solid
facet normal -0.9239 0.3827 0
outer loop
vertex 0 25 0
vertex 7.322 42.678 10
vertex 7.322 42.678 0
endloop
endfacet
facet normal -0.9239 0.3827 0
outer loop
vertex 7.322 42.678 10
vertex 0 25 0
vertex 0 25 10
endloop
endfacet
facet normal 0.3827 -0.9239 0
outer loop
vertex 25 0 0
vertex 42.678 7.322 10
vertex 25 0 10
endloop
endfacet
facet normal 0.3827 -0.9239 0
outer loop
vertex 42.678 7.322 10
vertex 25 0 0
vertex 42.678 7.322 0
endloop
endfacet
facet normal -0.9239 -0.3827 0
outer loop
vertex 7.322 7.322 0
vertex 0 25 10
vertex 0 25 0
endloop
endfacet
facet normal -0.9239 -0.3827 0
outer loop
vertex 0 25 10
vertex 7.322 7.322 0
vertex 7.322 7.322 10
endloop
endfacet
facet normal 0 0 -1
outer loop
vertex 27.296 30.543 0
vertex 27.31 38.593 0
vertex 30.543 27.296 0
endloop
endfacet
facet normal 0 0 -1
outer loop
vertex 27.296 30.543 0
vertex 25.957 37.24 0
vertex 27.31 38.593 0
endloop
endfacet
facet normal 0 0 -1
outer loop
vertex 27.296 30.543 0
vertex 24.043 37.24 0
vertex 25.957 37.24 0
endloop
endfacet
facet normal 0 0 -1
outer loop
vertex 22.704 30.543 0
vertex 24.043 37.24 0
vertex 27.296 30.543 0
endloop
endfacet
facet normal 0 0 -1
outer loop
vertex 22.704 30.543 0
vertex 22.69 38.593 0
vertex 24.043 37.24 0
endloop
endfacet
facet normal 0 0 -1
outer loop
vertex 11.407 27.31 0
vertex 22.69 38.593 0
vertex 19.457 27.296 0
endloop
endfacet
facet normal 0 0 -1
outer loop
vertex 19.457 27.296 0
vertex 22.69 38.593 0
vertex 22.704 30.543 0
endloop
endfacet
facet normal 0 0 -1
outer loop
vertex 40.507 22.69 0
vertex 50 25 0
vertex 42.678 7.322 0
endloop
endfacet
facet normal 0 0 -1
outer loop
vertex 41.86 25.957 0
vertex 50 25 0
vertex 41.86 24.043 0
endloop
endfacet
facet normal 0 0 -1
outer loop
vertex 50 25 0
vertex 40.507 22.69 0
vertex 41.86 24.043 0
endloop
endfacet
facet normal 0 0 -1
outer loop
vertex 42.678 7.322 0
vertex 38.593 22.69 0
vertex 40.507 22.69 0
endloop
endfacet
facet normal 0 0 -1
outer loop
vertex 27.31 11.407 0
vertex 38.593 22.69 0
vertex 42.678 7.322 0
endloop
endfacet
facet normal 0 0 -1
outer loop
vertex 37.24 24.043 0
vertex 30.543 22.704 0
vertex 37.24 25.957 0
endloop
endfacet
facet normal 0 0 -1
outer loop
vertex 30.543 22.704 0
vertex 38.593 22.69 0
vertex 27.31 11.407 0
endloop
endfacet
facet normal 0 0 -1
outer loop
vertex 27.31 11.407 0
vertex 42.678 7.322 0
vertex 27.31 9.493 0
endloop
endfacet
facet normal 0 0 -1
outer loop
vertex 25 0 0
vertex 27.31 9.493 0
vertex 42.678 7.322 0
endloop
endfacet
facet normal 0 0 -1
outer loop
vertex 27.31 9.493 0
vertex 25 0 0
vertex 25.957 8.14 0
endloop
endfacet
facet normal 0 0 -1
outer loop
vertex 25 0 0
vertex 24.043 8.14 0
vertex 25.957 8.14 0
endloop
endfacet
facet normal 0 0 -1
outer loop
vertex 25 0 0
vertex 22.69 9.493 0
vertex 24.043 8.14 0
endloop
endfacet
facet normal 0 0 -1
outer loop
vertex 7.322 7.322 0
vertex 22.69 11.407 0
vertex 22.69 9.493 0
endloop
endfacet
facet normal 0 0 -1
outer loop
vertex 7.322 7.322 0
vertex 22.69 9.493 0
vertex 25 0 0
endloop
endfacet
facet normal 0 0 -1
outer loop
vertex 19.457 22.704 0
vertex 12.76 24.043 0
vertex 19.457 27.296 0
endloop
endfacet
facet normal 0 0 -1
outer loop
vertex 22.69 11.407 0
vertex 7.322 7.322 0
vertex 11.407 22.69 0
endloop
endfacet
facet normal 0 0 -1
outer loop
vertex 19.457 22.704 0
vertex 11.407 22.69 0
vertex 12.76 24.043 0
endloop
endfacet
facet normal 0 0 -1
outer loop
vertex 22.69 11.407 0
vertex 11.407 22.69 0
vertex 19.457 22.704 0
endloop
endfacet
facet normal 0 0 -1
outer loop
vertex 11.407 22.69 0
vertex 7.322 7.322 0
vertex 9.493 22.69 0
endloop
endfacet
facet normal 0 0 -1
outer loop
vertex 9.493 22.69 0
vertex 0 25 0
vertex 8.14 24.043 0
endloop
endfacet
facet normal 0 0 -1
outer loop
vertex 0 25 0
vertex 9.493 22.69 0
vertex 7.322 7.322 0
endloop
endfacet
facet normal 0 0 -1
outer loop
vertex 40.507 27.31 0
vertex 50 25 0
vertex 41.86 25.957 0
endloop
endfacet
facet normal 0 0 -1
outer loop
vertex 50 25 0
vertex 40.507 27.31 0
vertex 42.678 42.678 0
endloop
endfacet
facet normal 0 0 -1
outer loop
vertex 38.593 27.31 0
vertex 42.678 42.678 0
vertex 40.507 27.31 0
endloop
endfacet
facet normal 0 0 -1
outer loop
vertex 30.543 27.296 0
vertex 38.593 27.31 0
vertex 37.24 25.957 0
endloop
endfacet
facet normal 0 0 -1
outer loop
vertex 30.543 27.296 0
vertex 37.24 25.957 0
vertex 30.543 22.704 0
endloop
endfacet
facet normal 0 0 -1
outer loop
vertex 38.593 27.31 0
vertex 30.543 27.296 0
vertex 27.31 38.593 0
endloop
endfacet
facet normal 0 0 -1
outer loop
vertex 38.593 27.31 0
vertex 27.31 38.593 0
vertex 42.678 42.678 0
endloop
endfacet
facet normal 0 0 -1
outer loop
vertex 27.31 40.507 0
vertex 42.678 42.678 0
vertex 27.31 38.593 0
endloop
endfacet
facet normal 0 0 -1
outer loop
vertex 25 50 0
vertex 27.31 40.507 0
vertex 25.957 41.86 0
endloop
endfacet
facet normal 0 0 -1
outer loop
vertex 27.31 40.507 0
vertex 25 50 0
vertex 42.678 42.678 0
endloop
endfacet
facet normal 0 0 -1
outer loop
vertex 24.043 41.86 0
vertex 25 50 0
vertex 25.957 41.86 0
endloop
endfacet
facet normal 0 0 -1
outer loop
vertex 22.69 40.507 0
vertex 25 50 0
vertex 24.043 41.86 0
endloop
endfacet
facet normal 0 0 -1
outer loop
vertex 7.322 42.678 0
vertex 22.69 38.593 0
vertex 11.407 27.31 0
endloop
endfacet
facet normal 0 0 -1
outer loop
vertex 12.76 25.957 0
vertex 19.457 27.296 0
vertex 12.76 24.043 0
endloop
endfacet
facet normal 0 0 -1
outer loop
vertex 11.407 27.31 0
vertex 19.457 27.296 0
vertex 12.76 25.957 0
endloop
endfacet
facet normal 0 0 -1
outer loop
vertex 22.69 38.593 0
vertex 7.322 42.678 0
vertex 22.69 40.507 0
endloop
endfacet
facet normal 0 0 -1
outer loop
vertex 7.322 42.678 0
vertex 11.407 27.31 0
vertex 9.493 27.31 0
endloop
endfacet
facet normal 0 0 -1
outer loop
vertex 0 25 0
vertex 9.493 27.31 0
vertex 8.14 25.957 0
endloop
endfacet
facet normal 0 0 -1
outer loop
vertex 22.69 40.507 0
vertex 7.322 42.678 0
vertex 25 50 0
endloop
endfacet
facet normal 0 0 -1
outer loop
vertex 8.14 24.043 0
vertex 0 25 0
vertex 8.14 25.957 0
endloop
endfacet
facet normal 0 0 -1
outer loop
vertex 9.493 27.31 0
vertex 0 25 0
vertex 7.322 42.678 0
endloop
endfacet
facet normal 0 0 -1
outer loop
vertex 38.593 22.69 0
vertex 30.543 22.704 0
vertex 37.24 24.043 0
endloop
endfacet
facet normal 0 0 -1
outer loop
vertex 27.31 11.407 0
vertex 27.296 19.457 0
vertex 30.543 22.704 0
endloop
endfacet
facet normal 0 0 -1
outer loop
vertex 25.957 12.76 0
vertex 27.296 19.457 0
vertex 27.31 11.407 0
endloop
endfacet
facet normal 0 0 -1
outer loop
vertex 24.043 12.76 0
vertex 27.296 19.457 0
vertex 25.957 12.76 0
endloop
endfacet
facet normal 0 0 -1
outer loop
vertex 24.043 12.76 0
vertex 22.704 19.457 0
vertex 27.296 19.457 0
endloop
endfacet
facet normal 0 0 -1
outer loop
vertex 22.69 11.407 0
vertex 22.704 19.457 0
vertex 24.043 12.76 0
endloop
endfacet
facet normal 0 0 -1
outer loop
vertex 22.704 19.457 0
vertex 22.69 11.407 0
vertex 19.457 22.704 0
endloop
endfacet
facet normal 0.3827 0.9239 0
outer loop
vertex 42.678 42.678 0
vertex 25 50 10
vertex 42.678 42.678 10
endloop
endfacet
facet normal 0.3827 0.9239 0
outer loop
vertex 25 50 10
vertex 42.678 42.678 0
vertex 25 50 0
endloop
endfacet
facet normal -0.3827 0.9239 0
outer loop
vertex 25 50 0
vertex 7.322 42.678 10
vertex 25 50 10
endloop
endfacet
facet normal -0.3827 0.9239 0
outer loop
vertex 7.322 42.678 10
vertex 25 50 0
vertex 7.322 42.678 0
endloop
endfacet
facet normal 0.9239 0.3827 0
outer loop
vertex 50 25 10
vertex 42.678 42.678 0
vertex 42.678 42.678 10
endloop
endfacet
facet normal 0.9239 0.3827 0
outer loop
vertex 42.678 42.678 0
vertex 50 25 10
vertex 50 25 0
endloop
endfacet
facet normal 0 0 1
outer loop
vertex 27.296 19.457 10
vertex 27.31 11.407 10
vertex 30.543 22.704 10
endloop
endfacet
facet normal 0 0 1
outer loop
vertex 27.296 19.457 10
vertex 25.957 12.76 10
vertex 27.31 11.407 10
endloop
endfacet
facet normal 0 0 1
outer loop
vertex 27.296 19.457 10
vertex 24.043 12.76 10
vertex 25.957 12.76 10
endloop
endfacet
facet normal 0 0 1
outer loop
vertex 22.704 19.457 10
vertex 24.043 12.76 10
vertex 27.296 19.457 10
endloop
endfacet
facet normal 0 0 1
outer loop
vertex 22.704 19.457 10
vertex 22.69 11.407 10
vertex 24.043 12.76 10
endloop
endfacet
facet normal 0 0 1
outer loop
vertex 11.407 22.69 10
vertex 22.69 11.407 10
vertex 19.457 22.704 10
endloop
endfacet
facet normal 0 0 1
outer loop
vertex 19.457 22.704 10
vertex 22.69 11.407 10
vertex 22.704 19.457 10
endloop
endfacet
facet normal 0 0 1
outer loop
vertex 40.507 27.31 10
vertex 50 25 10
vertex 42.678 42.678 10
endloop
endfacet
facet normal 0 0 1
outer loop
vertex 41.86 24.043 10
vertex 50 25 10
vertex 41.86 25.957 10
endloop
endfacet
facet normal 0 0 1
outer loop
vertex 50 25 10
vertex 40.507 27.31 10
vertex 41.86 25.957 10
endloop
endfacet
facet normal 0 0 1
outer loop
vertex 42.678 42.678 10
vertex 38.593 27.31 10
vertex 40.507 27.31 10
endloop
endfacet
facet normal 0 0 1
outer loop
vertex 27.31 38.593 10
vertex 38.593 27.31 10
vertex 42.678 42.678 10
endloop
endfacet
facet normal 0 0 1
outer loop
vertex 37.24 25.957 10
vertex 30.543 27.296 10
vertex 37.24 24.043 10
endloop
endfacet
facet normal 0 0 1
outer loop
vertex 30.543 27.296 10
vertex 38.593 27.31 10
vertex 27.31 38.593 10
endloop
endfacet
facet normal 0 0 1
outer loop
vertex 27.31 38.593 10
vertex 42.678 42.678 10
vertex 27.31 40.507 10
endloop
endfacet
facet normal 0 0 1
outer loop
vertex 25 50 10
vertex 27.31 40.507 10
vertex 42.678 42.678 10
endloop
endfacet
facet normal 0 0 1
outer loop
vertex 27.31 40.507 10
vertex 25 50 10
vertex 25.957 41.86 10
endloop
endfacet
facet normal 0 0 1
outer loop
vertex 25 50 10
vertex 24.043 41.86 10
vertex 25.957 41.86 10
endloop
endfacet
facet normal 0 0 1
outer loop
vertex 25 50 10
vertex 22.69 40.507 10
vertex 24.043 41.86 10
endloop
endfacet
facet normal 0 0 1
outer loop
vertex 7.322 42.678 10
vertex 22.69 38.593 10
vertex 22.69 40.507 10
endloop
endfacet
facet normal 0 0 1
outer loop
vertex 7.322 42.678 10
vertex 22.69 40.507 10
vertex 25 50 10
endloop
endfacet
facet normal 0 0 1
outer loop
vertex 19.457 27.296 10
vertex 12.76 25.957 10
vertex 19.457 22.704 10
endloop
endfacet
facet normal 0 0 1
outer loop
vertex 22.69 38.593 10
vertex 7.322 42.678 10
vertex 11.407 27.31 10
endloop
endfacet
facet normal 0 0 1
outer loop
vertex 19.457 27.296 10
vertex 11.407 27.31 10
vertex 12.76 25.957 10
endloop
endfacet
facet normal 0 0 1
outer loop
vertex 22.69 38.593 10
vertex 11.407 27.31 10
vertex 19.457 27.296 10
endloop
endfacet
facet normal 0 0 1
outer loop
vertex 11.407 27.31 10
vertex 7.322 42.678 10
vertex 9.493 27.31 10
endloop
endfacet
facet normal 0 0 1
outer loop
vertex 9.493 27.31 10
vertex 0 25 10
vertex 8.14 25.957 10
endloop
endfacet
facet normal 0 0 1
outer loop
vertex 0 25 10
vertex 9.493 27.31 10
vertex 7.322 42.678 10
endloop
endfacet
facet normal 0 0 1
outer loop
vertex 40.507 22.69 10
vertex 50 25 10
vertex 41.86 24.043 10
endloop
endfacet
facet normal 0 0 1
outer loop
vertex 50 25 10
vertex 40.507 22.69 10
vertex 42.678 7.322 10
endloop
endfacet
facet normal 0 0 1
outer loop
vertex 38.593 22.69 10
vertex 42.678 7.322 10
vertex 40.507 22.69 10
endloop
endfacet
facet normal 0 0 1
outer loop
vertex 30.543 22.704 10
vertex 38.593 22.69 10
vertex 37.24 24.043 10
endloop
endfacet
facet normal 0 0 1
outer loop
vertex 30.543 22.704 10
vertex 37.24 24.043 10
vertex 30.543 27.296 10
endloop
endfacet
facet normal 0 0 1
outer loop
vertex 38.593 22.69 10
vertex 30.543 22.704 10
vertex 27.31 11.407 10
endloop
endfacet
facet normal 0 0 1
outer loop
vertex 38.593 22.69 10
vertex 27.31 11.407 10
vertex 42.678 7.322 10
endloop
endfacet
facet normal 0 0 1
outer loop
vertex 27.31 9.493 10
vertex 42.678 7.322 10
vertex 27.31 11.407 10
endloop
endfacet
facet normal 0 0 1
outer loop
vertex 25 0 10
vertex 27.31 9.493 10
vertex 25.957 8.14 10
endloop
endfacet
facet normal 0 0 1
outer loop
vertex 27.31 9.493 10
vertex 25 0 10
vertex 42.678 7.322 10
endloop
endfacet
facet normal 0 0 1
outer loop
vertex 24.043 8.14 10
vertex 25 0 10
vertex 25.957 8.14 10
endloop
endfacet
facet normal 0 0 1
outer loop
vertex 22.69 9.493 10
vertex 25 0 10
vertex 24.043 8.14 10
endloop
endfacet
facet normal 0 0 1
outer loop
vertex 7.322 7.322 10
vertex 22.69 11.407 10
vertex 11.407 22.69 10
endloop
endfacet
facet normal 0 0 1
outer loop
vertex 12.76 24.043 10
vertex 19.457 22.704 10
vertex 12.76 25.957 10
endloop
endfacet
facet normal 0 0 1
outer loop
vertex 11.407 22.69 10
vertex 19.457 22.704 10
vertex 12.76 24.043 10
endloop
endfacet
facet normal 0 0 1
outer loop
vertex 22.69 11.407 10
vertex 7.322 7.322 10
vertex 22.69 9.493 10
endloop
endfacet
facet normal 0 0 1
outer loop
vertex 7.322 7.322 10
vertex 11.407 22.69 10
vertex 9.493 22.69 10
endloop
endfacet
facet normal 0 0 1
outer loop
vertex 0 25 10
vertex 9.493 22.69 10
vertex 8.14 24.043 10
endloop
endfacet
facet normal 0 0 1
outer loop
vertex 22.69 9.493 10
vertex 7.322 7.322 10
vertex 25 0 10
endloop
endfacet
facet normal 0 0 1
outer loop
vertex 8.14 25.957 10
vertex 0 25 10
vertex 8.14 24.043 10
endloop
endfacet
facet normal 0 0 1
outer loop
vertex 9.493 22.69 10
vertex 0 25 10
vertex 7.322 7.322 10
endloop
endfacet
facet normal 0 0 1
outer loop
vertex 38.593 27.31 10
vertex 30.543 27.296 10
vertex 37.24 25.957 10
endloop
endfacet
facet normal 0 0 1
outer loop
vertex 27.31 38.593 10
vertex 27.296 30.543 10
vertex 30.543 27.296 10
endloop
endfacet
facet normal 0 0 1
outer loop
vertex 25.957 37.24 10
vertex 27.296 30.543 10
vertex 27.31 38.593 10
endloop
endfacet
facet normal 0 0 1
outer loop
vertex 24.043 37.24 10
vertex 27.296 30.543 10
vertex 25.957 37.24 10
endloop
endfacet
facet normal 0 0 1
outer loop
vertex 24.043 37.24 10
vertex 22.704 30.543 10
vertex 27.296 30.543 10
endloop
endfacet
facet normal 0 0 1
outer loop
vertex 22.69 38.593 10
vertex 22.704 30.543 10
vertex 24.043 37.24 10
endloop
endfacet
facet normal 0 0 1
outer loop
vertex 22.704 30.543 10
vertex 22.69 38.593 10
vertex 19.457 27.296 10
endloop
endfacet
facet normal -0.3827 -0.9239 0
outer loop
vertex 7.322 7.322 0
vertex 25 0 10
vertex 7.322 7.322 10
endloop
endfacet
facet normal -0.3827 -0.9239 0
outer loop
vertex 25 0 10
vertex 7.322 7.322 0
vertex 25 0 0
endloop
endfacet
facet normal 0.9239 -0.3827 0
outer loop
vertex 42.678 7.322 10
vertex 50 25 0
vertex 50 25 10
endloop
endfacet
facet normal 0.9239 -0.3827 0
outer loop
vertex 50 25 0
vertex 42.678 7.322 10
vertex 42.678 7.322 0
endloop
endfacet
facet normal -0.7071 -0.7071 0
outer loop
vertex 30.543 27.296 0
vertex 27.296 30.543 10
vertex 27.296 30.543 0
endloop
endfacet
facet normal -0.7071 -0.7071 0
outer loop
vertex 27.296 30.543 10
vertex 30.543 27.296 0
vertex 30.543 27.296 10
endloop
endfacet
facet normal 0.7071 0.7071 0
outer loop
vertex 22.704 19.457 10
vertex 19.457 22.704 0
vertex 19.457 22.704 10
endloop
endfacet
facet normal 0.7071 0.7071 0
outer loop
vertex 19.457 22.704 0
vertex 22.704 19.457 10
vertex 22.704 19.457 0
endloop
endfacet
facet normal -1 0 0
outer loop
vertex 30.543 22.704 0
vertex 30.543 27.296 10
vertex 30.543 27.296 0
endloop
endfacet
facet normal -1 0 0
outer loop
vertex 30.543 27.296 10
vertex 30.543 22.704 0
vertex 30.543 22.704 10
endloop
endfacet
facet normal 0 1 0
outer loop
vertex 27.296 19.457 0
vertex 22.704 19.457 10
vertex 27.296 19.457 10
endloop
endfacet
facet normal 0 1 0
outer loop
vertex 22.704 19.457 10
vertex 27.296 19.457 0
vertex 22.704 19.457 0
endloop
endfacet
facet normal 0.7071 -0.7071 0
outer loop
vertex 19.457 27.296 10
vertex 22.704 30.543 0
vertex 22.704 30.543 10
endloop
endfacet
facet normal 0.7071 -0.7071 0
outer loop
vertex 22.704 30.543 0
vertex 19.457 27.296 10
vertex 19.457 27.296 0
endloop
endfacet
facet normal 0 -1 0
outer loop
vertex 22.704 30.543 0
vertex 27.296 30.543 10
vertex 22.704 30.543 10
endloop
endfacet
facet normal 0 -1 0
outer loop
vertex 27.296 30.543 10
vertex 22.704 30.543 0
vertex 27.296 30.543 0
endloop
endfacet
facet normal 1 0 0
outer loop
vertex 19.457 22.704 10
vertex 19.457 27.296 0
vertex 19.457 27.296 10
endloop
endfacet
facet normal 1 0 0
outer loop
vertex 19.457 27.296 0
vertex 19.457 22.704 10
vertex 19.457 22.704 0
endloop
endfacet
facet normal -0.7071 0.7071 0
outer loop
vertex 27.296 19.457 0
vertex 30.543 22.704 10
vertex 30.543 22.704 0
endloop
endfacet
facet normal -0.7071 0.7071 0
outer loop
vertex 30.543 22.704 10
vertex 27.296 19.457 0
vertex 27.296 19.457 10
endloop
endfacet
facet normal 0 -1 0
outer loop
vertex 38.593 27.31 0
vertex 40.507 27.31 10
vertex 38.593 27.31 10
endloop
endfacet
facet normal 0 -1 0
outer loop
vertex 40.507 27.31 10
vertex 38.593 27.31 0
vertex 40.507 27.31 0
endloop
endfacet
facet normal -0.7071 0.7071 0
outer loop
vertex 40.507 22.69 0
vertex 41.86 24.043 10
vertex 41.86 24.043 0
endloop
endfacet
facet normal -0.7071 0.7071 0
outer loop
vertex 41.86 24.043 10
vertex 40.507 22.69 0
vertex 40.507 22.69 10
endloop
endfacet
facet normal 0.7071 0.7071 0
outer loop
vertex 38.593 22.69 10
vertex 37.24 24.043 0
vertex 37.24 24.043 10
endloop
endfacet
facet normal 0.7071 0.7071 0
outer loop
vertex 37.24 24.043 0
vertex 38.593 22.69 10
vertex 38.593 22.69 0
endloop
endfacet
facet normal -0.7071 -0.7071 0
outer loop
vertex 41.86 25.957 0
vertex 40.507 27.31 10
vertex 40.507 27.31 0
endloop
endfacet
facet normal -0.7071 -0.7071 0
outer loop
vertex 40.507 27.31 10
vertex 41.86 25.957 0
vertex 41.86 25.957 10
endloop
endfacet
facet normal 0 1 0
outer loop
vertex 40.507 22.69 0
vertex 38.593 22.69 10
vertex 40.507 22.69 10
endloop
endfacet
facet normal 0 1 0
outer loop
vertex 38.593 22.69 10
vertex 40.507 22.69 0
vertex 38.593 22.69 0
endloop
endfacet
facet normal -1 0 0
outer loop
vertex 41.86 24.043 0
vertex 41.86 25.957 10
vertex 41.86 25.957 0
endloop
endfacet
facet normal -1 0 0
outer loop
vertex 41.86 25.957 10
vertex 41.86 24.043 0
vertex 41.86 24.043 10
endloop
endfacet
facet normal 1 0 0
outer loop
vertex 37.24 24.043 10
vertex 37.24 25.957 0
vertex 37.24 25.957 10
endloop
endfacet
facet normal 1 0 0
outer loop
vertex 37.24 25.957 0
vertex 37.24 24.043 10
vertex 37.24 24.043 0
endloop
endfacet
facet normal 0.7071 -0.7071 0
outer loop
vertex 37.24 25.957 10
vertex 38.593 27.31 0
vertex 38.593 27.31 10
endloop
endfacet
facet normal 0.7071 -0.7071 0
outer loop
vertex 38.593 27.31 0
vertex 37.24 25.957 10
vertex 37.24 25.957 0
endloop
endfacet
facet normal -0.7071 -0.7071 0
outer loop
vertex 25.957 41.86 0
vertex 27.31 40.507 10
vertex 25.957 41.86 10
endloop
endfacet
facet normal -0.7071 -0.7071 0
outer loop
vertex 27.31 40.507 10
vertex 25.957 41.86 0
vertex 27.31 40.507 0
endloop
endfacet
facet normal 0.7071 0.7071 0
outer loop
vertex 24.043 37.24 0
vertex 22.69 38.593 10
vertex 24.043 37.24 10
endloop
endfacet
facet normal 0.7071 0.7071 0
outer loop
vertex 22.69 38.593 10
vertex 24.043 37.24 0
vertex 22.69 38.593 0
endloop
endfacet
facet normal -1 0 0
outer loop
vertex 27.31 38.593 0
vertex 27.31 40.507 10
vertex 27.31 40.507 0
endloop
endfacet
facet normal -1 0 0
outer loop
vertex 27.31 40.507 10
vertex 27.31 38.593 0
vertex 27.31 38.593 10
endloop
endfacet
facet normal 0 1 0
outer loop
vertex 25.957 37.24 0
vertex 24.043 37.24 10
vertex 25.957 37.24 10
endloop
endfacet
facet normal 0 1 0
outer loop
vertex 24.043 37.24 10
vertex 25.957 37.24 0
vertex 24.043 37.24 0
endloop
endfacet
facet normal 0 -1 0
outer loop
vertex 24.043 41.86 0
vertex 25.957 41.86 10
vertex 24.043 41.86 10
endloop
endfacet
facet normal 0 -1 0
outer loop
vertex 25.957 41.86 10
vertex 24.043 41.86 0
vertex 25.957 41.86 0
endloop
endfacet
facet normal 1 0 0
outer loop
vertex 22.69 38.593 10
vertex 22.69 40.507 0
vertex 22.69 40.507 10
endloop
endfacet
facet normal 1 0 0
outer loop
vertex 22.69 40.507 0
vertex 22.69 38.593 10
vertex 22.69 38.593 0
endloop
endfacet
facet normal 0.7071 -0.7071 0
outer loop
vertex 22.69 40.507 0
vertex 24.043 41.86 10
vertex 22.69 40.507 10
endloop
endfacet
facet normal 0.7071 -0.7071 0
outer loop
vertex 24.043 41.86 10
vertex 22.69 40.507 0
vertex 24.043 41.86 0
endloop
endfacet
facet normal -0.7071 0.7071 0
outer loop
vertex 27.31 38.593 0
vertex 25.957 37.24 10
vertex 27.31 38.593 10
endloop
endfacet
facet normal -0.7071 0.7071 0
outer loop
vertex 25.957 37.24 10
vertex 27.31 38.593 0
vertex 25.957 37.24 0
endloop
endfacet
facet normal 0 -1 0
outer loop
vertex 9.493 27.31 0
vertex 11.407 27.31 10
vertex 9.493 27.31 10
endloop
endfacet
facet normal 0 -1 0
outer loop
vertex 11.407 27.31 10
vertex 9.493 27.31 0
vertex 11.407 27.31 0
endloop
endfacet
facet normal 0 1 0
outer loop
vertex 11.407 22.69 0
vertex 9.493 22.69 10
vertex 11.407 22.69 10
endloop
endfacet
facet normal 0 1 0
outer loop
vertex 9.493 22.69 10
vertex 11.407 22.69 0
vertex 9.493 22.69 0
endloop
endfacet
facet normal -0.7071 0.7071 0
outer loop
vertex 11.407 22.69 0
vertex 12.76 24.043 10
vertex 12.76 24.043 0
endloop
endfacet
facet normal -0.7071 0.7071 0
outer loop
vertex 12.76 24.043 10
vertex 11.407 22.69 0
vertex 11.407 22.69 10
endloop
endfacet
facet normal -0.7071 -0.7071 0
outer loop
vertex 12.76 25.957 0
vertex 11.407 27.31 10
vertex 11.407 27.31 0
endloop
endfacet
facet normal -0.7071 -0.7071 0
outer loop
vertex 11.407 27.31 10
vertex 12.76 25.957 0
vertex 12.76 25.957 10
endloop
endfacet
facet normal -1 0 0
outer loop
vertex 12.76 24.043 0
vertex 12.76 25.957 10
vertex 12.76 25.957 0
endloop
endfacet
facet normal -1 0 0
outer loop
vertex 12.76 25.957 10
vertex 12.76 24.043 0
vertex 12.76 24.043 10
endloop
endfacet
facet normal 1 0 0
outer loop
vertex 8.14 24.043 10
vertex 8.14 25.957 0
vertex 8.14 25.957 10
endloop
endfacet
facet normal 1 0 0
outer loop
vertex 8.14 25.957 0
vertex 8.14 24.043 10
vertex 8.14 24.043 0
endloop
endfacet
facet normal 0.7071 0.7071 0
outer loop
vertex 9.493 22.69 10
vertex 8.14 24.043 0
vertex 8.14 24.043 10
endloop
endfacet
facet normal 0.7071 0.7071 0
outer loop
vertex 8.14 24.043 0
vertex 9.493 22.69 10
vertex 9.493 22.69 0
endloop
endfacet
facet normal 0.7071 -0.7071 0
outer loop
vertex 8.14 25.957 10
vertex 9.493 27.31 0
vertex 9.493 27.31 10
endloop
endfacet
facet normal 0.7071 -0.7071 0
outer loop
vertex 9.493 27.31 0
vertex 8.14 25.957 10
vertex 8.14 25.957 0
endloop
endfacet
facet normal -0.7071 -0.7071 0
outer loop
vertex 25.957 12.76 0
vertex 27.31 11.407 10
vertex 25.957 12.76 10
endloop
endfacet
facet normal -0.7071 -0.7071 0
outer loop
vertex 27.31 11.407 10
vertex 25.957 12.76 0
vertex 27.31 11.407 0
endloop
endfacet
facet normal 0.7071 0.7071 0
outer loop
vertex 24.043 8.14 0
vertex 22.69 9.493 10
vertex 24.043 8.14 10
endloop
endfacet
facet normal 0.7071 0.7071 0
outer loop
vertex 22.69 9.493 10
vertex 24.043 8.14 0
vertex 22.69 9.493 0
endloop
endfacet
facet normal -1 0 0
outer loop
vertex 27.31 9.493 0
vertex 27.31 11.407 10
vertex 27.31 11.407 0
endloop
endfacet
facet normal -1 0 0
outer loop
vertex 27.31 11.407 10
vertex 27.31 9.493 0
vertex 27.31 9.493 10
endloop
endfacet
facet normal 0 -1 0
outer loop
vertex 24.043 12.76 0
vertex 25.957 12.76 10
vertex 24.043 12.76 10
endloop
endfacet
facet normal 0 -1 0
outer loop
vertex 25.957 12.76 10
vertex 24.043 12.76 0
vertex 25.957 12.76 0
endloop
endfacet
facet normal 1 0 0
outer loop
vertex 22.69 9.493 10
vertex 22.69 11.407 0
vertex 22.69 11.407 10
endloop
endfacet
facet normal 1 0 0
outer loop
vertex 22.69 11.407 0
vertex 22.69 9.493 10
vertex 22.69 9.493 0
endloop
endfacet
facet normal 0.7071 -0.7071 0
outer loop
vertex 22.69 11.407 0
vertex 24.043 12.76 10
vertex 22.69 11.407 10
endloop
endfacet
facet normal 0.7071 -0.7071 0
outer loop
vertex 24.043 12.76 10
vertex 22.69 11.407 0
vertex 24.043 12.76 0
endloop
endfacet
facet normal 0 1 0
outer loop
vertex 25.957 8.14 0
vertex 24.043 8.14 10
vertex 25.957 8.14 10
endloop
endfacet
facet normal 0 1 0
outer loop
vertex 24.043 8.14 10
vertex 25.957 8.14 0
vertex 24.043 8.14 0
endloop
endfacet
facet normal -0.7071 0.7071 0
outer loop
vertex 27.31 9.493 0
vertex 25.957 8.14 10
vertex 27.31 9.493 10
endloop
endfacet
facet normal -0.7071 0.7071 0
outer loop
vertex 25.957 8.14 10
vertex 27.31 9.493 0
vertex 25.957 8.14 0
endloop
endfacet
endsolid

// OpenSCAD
$fn = 32;

// ----------------------------------------------------------------------
// Polygon plate: 8-gon R25, 4 bolt windows
// ----------------------------------------------------------------------

// --- parameters (mm) ---
sides = 8;                // number of polygon sides
plate_r = 25;             // circumscribed radius of the polygon
bore_r = 6;               // centre bore radius
bolts = 4;                // number of bolt windows
ring_r = 14.55;           // bolt-circle radius
bolt_r = 2.5;             // bolt window radius
plate_t = 10;             // plate thickness, Z (extrusion height)

plate_d = 2 * plate_r;  // circumscribed diameter
bore_d = 2 * bore_r;  // centre bore diameter
bolt_d = 2 * bolt_r;  // bolt window diameter
ring_d = 2 * ring_r;  // bolt-circle diameter

profile = [[50, 25], [42.678, 42.678], [25, 50], [7.322, 42.678], [0, 25], [7.322, 7.322], [25, 0], [42.678, 7.322]];  // primary outline, 8 points, counter clockwise
void_1 = [[30.543, 27.296], [27.296, 30.543], [22.704, 30.543], [19.457, 27.296], [19.457, 22.704], [22.704, 19.457], [27.296, 19.457], [30.543, 22.704]];  // centre bore, 8 points
void_2 = [[41.86, 25.957], [40.507, 27.31], [38.593, 27.31], [37.24, 25.957], [37.24, 24.043], [38.593, 22.69], [40.507, 22.69], [41.86, 24.043]];  // bolt window 1, 8 points
void_3 = [[27.31, 40.507], [25.957, 41.86], [24.043, 41.86], [22.69, 40.507], [22.69, 38.593], [24.043, 37.24], [25.957, 37.24], [27.31, 38.593]];  // bolt window 2, 8 points
void_4 = [[12.76, 25.957], [11.407, 27.31], [9.493, 27.31], [8.14, 25.957], [8.14, 24.043], [9.493, 22.69], [11.407, 22.69], [12.76, 24.043]];  // bolt window 3, 8 points
void_5 = [[27.31, 11.407], [25.957, 12.76], [24.043, 12.76], [22.69, 11.407], [22.69, 9.493], [24.043, 8.14], [25.957, 8.14], [27.31, 9.493]];  // bolt window 4, 8 points

// --- the one profile operation ---
difference() {
  linear_extrude(height = plate_t) polygon(points = profile);
  translate([0, 0, -1])
    linear_extrude(height = plate_t + 2) polygon(points = void_1);
  translate([0, 0, -1])
    linear_extrude(height = plate_t + 2) polygon(points = void_2);
  translate([0, 0, -1])
    linear_extrude(height = plate_t + 2) polygon(points = void_3);
  translate([0, 0, -1])
    linear_extrude(height = plate_t + 2) polygon(points = void_4);
  translate([0, 0, -1])
    linear_extrude(height = plate_t + 2) polygon(points = void_5);
}
